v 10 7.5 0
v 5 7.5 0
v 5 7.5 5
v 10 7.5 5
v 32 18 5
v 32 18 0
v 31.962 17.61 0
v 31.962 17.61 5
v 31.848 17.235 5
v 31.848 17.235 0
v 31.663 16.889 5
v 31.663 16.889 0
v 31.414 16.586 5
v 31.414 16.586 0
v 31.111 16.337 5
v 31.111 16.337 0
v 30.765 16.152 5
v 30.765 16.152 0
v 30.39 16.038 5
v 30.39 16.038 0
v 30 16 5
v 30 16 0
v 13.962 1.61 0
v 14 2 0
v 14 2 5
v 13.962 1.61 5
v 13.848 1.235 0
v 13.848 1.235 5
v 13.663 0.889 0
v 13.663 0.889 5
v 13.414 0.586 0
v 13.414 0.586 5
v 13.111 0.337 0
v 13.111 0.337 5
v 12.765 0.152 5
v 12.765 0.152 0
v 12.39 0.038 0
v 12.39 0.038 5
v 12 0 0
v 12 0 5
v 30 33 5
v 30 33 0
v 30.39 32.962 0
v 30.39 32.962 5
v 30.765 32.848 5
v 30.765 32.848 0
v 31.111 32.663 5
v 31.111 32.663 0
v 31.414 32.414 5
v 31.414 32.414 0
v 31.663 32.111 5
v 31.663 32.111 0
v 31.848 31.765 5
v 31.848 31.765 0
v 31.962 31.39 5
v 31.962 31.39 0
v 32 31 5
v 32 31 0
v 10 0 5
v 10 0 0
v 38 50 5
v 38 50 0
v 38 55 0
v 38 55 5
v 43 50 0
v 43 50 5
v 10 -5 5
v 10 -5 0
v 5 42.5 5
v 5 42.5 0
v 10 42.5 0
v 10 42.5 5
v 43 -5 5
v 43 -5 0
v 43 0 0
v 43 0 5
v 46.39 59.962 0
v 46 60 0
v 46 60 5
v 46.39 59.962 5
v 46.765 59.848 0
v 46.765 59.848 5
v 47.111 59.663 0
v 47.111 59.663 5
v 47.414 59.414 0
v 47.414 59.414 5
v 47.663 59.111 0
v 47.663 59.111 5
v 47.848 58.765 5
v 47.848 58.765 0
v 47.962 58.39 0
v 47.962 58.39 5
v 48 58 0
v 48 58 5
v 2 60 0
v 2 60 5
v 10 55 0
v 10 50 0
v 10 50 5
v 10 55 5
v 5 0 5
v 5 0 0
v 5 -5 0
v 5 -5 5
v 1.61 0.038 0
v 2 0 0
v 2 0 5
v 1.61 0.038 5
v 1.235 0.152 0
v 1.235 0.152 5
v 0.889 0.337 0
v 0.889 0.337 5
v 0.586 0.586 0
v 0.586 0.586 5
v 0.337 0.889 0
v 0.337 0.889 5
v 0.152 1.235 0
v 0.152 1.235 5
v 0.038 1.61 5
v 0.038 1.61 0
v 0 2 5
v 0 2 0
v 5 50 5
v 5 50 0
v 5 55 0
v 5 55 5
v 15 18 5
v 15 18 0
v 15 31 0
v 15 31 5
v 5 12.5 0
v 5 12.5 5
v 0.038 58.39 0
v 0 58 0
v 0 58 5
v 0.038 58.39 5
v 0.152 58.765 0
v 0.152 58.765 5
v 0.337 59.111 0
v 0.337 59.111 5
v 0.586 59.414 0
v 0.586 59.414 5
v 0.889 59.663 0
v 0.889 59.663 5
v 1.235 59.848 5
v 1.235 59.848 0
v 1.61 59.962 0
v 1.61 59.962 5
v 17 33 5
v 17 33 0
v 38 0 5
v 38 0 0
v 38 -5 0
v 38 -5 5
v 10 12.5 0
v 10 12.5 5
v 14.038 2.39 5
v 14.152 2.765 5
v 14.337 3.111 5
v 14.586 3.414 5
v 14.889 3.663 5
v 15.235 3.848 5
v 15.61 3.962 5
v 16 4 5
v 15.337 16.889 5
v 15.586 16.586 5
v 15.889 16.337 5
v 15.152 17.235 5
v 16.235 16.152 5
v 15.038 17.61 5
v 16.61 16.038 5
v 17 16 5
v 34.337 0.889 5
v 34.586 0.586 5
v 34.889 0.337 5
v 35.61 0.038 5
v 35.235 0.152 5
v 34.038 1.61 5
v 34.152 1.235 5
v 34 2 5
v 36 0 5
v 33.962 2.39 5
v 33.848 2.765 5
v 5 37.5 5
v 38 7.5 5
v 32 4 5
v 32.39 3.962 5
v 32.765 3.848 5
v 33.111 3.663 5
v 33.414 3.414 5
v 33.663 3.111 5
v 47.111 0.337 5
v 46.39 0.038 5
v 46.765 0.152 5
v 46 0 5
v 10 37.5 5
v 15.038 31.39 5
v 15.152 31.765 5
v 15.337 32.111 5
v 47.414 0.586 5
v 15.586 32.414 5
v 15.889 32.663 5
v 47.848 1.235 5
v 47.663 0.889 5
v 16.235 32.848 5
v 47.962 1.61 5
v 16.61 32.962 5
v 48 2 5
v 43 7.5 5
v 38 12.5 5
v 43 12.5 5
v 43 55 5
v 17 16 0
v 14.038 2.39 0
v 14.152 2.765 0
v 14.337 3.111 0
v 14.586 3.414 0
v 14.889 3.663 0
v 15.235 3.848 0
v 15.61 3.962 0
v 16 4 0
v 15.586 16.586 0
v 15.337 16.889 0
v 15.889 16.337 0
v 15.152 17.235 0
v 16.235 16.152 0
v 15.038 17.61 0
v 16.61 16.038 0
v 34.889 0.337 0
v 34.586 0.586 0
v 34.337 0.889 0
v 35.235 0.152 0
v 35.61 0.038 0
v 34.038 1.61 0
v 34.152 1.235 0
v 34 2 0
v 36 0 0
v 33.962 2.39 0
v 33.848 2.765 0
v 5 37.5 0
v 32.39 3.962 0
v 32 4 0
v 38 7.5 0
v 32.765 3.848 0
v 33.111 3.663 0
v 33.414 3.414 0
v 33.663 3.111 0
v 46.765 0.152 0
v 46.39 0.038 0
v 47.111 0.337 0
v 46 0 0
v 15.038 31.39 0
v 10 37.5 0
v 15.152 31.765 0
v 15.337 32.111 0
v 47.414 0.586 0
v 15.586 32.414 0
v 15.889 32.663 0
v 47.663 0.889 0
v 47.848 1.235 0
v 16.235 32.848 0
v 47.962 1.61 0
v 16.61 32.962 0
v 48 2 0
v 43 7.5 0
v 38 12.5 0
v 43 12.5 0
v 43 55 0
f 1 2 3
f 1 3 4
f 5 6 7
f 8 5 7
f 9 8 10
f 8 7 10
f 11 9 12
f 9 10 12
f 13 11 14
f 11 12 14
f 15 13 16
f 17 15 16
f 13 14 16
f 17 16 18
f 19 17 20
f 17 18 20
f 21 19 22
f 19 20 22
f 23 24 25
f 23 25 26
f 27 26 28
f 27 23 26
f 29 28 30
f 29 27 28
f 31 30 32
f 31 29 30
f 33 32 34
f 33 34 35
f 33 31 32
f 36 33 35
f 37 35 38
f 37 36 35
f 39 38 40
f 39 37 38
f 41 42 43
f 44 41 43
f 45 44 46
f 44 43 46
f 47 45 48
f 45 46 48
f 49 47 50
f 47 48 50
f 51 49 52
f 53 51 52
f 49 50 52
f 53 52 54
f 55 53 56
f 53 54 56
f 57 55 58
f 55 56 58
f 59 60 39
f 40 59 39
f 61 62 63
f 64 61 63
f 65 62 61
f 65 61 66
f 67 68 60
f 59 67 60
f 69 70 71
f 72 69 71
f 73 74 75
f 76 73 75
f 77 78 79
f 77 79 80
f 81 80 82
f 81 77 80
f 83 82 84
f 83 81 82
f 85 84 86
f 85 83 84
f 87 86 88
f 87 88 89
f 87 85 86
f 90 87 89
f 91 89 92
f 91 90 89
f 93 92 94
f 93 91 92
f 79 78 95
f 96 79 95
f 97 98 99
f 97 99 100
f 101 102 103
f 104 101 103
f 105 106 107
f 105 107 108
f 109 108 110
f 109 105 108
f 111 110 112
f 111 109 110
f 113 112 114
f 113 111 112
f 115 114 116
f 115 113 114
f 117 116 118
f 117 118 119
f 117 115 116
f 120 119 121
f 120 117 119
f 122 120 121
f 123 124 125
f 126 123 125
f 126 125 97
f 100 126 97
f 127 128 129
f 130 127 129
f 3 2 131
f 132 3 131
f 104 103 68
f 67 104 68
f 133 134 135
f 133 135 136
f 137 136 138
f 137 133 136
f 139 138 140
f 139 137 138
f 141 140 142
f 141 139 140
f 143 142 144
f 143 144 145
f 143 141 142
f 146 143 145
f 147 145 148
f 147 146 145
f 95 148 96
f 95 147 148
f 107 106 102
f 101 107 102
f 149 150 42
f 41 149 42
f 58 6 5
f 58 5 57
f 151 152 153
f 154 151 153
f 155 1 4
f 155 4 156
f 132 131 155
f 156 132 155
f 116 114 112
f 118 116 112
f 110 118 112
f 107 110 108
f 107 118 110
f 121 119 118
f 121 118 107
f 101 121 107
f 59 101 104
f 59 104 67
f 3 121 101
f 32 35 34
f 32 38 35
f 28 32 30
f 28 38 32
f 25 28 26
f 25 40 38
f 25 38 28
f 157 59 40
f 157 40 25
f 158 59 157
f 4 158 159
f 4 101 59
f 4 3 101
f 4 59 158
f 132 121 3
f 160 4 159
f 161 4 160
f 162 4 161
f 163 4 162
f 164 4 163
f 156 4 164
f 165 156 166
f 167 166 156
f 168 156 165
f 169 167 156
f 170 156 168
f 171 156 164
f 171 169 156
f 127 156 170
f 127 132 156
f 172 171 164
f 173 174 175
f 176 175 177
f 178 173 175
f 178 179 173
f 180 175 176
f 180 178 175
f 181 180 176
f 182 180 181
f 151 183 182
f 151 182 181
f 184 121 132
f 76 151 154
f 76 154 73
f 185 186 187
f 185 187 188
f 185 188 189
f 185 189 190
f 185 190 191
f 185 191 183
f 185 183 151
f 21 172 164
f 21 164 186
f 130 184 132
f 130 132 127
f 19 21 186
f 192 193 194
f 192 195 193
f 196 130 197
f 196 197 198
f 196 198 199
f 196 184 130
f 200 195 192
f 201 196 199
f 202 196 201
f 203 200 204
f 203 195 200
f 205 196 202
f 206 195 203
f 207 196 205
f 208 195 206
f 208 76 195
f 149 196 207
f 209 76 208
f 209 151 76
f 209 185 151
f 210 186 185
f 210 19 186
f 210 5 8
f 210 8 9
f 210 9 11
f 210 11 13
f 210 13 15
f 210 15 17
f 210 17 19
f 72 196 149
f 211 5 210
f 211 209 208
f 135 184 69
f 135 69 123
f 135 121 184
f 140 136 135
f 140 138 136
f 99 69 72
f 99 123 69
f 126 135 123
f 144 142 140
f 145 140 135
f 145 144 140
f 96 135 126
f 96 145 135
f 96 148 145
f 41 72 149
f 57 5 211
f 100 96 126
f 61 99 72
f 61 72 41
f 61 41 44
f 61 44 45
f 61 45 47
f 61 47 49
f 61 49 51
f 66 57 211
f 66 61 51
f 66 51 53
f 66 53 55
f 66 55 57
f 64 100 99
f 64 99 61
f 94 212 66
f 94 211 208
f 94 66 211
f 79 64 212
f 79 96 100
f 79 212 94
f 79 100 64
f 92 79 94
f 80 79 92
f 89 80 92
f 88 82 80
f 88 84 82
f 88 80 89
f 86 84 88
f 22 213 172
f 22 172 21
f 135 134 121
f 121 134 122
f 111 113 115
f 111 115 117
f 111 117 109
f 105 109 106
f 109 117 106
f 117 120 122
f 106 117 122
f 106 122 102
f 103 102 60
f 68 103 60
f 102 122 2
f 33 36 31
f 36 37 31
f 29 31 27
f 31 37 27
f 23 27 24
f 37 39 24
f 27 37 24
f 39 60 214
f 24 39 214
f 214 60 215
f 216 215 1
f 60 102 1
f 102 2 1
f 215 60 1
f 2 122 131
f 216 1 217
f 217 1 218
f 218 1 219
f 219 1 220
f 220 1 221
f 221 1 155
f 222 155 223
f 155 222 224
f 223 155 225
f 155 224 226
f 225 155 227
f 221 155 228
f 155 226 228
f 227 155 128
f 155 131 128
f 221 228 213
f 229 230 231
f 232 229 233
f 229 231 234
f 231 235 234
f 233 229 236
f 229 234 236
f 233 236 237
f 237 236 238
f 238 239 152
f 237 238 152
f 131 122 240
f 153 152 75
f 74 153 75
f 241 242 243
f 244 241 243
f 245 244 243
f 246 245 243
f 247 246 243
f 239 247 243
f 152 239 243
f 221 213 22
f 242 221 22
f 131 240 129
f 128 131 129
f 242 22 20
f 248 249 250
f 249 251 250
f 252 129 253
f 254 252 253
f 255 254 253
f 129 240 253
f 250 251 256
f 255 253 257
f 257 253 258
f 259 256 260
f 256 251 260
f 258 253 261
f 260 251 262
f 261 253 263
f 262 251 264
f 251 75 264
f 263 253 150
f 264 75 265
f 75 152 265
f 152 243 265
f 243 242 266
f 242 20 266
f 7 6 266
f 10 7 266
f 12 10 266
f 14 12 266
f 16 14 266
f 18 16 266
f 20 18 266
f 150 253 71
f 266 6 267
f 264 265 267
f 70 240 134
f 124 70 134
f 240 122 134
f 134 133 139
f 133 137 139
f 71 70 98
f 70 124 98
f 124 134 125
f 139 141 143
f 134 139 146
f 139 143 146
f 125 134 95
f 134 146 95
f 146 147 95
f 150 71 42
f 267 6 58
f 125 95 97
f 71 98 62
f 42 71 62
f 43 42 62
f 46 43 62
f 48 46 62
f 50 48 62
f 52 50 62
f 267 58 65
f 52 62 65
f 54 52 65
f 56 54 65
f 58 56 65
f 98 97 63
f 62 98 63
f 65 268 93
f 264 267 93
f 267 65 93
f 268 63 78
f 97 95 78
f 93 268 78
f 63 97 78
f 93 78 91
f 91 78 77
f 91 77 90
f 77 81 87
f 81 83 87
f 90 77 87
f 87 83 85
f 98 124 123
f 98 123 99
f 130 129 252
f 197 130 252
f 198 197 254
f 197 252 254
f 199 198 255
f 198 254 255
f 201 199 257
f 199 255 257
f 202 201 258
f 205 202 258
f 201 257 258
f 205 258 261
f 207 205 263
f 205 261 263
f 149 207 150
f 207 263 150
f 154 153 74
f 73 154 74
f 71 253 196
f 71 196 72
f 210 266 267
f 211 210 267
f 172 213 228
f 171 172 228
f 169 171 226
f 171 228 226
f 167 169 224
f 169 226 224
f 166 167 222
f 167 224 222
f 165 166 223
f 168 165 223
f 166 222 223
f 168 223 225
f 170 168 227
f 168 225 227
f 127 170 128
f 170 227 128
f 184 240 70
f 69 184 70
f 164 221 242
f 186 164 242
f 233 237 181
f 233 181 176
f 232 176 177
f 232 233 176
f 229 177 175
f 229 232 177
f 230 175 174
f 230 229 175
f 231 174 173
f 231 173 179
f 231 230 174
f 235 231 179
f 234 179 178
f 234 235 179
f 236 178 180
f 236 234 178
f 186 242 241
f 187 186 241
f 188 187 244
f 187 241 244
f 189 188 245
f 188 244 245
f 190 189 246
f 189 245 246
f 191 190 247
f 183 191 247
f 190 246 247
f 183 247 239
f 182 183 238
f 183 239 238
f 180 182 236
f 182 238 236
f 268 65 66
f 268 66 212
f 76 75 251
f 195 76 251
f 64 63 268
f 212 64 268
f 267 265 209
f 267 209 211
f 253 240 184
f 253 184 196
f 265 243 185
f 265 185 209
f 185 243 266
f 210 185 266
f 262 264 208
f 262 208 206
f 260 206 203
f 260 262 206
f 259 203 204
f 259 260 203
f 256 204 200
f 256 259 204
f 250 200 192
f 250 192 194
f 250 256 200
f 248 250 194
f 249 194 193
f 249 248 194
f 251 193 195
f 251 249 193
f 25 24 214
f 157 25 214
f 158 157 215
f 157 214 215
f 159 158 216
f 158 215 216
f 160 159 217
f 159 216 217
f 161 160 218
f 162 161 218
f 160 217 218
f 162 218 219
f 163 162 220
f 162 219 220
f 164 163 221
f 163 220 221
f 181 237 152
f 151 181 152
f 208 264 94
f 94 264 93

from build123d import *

# Parameters (mm, degrees)
ESQUISSE1_W        = 5
ESQUISSE1_H        = 5
ESQUISSE1_W_2      = 17
ESQUISSE1_H_2      = 17
BOSS_EXTRU_1_DEPTH = 5
CONG_1_START       = -1
CONG_1_DEPTH       = 7
CONG_1_2_DEPTH     = 5


with BuildPart() as part:
    # Esquisse1 → Boss.-Extru.1 (new body)
    with BuildSketch(Plane.XY):
        Polygon((0, 0), (5, 0), (5, -5), (10, -5), (10, 0), (14, 0), (14, 4), (34, 4), (34, 0), (38, 0), (38, -5), (43, -5), (43, 0), (48, 0), (48, 60), (0, 60), align=None)
        with Locations((7.5, 10)):
            Rectangle(ESQUISSE1_W, ESQUISSE1_H, mode=Mode.SUBTRACT)
        with Locations((7.5, 40)):
            Rectangle(ESQUISSE1_W, ESQUISSE1_H, mode=Mode.SUBTRACT)
        with Locations((40.5, 10)):
            Rectangle(ESQUISSE1_W, ESQUISSE1_H, mode=Mode.SUBTRACT)
        with Locations((40.5, 52.5)):
            Rectangle(ESQUISSE1_W, ESQUISSE1_H, mode=Mode.SUBTRACT)
        with Locations((7.5, 52.5)):
            Rectangle(ESQUISSE1_W, ESQUISSE1_H, mode=Mode.SUBTRACT)
        with Locations((23.5, 24.5)):
            Rectangle(ESQUISSE1_W_2, ESQUISSE1_H_2, mode=Mode.SUBTRACT)
    extrude(amount=BOSS_EXTRU_1_DEPTH)

    # Congé1: read off the stored shape, not the designer's step
    # Congé1 outline → Congé1 (cut)
    with BuildSketch(Plane.XY.offset(CONG_1_START)):
        with BuildLine():
            Line((14, 0), (14, 2))
            ThreePointArc((14, 2), (13.414213562, 0.585786438), (12, 0))
            Line((12, 0), (14, 0))
        make_face()
        with BuildLine():
            ThreePointArc((36, 0), (34.585786438, 0.585786438), (34, 2))
            Line((34, 2), (34, 0))
            Line((34, 0), (36, 0))
        make_face()
        with BuildLine():
            Line((48, 0), (48, 2))
            ThreePointArc((48, 2), (47.414213562, 0.585786438), (46, 0))
            Line((46, 0), (48, 0))
        make_face()
        with BuildLine():
            ThreePointArc((2, 0), (0.585786438, 0.585786438), (0, 2))
            Line((0, 2), (0, 0))
            Line((0, 0), (2, 0))
        make_face()
        with BuildLine():
            ThreePointArc((0, 58), (0.585786438, 59.414213562), (2, 60))
            Line((2, 60), (0, 60))
            Line((0, 60), (0, 58))
        make_face()
        with BuildLine():
            ThreePointArc((46, 60), (47.414213562, 59.414213562), (48, 58))
            Line((48, 58), (48, 60))
            Line((48, 60), (46, 60))
        make_face()
    extrude(amount=CONG_1_DEPTH, mode=Mode.SUBTRACT)

    # Cong_1 2 outline → Cong_1 2 (add)
    with BuildSketch(Plane.XY):
        with BuildLine():
            ThreePointArc((30, 33), (31.414213562, 32.414213562), (32, 31))
            Line((32, 31), (32, 33))
            Line((32, 33), (30, 33))
        make_face()
        with BuildLine():
            Line((32, 16), (32, 18))
            ThreePointArc((32, 18), (31.414213562, 16.585786438), (30, 16))
            Line((30, 16), (32, 16))
        make_face()
        with BuildLine():
            ThreePointArc((15, 31), (15.585786438, 32.414213562), (17, 33))
            Line((17, 33), (15, 33))
            Line((15, 33), (15, 31))
        make_face()
        with BuildLine():
            Line((15, 16), (17, 16))
            ThreePointArc((17, 16), (15.585786438, 16.585786438), (15, 18))
            Line((15, 18), (15, 16))
        make_face()
        with BuildLine():
            Line((34, 4), (32, 4))
            ThreePointArc((32, 4), (33.414213562, 3.414213562), (34, 2))
            Line((34, 2), (34, 4))
        make_face()
        with BuildLine():
            ThreePointArc((14, 2), (14.585786438, 3.414213562), (16, 4))
            Line((16, 4), (14, 4))
            Line((14, 4), (14, 2))
        make_face()
    extrude(amount=CONG_1_2_DEPTH)


solid = part.part
